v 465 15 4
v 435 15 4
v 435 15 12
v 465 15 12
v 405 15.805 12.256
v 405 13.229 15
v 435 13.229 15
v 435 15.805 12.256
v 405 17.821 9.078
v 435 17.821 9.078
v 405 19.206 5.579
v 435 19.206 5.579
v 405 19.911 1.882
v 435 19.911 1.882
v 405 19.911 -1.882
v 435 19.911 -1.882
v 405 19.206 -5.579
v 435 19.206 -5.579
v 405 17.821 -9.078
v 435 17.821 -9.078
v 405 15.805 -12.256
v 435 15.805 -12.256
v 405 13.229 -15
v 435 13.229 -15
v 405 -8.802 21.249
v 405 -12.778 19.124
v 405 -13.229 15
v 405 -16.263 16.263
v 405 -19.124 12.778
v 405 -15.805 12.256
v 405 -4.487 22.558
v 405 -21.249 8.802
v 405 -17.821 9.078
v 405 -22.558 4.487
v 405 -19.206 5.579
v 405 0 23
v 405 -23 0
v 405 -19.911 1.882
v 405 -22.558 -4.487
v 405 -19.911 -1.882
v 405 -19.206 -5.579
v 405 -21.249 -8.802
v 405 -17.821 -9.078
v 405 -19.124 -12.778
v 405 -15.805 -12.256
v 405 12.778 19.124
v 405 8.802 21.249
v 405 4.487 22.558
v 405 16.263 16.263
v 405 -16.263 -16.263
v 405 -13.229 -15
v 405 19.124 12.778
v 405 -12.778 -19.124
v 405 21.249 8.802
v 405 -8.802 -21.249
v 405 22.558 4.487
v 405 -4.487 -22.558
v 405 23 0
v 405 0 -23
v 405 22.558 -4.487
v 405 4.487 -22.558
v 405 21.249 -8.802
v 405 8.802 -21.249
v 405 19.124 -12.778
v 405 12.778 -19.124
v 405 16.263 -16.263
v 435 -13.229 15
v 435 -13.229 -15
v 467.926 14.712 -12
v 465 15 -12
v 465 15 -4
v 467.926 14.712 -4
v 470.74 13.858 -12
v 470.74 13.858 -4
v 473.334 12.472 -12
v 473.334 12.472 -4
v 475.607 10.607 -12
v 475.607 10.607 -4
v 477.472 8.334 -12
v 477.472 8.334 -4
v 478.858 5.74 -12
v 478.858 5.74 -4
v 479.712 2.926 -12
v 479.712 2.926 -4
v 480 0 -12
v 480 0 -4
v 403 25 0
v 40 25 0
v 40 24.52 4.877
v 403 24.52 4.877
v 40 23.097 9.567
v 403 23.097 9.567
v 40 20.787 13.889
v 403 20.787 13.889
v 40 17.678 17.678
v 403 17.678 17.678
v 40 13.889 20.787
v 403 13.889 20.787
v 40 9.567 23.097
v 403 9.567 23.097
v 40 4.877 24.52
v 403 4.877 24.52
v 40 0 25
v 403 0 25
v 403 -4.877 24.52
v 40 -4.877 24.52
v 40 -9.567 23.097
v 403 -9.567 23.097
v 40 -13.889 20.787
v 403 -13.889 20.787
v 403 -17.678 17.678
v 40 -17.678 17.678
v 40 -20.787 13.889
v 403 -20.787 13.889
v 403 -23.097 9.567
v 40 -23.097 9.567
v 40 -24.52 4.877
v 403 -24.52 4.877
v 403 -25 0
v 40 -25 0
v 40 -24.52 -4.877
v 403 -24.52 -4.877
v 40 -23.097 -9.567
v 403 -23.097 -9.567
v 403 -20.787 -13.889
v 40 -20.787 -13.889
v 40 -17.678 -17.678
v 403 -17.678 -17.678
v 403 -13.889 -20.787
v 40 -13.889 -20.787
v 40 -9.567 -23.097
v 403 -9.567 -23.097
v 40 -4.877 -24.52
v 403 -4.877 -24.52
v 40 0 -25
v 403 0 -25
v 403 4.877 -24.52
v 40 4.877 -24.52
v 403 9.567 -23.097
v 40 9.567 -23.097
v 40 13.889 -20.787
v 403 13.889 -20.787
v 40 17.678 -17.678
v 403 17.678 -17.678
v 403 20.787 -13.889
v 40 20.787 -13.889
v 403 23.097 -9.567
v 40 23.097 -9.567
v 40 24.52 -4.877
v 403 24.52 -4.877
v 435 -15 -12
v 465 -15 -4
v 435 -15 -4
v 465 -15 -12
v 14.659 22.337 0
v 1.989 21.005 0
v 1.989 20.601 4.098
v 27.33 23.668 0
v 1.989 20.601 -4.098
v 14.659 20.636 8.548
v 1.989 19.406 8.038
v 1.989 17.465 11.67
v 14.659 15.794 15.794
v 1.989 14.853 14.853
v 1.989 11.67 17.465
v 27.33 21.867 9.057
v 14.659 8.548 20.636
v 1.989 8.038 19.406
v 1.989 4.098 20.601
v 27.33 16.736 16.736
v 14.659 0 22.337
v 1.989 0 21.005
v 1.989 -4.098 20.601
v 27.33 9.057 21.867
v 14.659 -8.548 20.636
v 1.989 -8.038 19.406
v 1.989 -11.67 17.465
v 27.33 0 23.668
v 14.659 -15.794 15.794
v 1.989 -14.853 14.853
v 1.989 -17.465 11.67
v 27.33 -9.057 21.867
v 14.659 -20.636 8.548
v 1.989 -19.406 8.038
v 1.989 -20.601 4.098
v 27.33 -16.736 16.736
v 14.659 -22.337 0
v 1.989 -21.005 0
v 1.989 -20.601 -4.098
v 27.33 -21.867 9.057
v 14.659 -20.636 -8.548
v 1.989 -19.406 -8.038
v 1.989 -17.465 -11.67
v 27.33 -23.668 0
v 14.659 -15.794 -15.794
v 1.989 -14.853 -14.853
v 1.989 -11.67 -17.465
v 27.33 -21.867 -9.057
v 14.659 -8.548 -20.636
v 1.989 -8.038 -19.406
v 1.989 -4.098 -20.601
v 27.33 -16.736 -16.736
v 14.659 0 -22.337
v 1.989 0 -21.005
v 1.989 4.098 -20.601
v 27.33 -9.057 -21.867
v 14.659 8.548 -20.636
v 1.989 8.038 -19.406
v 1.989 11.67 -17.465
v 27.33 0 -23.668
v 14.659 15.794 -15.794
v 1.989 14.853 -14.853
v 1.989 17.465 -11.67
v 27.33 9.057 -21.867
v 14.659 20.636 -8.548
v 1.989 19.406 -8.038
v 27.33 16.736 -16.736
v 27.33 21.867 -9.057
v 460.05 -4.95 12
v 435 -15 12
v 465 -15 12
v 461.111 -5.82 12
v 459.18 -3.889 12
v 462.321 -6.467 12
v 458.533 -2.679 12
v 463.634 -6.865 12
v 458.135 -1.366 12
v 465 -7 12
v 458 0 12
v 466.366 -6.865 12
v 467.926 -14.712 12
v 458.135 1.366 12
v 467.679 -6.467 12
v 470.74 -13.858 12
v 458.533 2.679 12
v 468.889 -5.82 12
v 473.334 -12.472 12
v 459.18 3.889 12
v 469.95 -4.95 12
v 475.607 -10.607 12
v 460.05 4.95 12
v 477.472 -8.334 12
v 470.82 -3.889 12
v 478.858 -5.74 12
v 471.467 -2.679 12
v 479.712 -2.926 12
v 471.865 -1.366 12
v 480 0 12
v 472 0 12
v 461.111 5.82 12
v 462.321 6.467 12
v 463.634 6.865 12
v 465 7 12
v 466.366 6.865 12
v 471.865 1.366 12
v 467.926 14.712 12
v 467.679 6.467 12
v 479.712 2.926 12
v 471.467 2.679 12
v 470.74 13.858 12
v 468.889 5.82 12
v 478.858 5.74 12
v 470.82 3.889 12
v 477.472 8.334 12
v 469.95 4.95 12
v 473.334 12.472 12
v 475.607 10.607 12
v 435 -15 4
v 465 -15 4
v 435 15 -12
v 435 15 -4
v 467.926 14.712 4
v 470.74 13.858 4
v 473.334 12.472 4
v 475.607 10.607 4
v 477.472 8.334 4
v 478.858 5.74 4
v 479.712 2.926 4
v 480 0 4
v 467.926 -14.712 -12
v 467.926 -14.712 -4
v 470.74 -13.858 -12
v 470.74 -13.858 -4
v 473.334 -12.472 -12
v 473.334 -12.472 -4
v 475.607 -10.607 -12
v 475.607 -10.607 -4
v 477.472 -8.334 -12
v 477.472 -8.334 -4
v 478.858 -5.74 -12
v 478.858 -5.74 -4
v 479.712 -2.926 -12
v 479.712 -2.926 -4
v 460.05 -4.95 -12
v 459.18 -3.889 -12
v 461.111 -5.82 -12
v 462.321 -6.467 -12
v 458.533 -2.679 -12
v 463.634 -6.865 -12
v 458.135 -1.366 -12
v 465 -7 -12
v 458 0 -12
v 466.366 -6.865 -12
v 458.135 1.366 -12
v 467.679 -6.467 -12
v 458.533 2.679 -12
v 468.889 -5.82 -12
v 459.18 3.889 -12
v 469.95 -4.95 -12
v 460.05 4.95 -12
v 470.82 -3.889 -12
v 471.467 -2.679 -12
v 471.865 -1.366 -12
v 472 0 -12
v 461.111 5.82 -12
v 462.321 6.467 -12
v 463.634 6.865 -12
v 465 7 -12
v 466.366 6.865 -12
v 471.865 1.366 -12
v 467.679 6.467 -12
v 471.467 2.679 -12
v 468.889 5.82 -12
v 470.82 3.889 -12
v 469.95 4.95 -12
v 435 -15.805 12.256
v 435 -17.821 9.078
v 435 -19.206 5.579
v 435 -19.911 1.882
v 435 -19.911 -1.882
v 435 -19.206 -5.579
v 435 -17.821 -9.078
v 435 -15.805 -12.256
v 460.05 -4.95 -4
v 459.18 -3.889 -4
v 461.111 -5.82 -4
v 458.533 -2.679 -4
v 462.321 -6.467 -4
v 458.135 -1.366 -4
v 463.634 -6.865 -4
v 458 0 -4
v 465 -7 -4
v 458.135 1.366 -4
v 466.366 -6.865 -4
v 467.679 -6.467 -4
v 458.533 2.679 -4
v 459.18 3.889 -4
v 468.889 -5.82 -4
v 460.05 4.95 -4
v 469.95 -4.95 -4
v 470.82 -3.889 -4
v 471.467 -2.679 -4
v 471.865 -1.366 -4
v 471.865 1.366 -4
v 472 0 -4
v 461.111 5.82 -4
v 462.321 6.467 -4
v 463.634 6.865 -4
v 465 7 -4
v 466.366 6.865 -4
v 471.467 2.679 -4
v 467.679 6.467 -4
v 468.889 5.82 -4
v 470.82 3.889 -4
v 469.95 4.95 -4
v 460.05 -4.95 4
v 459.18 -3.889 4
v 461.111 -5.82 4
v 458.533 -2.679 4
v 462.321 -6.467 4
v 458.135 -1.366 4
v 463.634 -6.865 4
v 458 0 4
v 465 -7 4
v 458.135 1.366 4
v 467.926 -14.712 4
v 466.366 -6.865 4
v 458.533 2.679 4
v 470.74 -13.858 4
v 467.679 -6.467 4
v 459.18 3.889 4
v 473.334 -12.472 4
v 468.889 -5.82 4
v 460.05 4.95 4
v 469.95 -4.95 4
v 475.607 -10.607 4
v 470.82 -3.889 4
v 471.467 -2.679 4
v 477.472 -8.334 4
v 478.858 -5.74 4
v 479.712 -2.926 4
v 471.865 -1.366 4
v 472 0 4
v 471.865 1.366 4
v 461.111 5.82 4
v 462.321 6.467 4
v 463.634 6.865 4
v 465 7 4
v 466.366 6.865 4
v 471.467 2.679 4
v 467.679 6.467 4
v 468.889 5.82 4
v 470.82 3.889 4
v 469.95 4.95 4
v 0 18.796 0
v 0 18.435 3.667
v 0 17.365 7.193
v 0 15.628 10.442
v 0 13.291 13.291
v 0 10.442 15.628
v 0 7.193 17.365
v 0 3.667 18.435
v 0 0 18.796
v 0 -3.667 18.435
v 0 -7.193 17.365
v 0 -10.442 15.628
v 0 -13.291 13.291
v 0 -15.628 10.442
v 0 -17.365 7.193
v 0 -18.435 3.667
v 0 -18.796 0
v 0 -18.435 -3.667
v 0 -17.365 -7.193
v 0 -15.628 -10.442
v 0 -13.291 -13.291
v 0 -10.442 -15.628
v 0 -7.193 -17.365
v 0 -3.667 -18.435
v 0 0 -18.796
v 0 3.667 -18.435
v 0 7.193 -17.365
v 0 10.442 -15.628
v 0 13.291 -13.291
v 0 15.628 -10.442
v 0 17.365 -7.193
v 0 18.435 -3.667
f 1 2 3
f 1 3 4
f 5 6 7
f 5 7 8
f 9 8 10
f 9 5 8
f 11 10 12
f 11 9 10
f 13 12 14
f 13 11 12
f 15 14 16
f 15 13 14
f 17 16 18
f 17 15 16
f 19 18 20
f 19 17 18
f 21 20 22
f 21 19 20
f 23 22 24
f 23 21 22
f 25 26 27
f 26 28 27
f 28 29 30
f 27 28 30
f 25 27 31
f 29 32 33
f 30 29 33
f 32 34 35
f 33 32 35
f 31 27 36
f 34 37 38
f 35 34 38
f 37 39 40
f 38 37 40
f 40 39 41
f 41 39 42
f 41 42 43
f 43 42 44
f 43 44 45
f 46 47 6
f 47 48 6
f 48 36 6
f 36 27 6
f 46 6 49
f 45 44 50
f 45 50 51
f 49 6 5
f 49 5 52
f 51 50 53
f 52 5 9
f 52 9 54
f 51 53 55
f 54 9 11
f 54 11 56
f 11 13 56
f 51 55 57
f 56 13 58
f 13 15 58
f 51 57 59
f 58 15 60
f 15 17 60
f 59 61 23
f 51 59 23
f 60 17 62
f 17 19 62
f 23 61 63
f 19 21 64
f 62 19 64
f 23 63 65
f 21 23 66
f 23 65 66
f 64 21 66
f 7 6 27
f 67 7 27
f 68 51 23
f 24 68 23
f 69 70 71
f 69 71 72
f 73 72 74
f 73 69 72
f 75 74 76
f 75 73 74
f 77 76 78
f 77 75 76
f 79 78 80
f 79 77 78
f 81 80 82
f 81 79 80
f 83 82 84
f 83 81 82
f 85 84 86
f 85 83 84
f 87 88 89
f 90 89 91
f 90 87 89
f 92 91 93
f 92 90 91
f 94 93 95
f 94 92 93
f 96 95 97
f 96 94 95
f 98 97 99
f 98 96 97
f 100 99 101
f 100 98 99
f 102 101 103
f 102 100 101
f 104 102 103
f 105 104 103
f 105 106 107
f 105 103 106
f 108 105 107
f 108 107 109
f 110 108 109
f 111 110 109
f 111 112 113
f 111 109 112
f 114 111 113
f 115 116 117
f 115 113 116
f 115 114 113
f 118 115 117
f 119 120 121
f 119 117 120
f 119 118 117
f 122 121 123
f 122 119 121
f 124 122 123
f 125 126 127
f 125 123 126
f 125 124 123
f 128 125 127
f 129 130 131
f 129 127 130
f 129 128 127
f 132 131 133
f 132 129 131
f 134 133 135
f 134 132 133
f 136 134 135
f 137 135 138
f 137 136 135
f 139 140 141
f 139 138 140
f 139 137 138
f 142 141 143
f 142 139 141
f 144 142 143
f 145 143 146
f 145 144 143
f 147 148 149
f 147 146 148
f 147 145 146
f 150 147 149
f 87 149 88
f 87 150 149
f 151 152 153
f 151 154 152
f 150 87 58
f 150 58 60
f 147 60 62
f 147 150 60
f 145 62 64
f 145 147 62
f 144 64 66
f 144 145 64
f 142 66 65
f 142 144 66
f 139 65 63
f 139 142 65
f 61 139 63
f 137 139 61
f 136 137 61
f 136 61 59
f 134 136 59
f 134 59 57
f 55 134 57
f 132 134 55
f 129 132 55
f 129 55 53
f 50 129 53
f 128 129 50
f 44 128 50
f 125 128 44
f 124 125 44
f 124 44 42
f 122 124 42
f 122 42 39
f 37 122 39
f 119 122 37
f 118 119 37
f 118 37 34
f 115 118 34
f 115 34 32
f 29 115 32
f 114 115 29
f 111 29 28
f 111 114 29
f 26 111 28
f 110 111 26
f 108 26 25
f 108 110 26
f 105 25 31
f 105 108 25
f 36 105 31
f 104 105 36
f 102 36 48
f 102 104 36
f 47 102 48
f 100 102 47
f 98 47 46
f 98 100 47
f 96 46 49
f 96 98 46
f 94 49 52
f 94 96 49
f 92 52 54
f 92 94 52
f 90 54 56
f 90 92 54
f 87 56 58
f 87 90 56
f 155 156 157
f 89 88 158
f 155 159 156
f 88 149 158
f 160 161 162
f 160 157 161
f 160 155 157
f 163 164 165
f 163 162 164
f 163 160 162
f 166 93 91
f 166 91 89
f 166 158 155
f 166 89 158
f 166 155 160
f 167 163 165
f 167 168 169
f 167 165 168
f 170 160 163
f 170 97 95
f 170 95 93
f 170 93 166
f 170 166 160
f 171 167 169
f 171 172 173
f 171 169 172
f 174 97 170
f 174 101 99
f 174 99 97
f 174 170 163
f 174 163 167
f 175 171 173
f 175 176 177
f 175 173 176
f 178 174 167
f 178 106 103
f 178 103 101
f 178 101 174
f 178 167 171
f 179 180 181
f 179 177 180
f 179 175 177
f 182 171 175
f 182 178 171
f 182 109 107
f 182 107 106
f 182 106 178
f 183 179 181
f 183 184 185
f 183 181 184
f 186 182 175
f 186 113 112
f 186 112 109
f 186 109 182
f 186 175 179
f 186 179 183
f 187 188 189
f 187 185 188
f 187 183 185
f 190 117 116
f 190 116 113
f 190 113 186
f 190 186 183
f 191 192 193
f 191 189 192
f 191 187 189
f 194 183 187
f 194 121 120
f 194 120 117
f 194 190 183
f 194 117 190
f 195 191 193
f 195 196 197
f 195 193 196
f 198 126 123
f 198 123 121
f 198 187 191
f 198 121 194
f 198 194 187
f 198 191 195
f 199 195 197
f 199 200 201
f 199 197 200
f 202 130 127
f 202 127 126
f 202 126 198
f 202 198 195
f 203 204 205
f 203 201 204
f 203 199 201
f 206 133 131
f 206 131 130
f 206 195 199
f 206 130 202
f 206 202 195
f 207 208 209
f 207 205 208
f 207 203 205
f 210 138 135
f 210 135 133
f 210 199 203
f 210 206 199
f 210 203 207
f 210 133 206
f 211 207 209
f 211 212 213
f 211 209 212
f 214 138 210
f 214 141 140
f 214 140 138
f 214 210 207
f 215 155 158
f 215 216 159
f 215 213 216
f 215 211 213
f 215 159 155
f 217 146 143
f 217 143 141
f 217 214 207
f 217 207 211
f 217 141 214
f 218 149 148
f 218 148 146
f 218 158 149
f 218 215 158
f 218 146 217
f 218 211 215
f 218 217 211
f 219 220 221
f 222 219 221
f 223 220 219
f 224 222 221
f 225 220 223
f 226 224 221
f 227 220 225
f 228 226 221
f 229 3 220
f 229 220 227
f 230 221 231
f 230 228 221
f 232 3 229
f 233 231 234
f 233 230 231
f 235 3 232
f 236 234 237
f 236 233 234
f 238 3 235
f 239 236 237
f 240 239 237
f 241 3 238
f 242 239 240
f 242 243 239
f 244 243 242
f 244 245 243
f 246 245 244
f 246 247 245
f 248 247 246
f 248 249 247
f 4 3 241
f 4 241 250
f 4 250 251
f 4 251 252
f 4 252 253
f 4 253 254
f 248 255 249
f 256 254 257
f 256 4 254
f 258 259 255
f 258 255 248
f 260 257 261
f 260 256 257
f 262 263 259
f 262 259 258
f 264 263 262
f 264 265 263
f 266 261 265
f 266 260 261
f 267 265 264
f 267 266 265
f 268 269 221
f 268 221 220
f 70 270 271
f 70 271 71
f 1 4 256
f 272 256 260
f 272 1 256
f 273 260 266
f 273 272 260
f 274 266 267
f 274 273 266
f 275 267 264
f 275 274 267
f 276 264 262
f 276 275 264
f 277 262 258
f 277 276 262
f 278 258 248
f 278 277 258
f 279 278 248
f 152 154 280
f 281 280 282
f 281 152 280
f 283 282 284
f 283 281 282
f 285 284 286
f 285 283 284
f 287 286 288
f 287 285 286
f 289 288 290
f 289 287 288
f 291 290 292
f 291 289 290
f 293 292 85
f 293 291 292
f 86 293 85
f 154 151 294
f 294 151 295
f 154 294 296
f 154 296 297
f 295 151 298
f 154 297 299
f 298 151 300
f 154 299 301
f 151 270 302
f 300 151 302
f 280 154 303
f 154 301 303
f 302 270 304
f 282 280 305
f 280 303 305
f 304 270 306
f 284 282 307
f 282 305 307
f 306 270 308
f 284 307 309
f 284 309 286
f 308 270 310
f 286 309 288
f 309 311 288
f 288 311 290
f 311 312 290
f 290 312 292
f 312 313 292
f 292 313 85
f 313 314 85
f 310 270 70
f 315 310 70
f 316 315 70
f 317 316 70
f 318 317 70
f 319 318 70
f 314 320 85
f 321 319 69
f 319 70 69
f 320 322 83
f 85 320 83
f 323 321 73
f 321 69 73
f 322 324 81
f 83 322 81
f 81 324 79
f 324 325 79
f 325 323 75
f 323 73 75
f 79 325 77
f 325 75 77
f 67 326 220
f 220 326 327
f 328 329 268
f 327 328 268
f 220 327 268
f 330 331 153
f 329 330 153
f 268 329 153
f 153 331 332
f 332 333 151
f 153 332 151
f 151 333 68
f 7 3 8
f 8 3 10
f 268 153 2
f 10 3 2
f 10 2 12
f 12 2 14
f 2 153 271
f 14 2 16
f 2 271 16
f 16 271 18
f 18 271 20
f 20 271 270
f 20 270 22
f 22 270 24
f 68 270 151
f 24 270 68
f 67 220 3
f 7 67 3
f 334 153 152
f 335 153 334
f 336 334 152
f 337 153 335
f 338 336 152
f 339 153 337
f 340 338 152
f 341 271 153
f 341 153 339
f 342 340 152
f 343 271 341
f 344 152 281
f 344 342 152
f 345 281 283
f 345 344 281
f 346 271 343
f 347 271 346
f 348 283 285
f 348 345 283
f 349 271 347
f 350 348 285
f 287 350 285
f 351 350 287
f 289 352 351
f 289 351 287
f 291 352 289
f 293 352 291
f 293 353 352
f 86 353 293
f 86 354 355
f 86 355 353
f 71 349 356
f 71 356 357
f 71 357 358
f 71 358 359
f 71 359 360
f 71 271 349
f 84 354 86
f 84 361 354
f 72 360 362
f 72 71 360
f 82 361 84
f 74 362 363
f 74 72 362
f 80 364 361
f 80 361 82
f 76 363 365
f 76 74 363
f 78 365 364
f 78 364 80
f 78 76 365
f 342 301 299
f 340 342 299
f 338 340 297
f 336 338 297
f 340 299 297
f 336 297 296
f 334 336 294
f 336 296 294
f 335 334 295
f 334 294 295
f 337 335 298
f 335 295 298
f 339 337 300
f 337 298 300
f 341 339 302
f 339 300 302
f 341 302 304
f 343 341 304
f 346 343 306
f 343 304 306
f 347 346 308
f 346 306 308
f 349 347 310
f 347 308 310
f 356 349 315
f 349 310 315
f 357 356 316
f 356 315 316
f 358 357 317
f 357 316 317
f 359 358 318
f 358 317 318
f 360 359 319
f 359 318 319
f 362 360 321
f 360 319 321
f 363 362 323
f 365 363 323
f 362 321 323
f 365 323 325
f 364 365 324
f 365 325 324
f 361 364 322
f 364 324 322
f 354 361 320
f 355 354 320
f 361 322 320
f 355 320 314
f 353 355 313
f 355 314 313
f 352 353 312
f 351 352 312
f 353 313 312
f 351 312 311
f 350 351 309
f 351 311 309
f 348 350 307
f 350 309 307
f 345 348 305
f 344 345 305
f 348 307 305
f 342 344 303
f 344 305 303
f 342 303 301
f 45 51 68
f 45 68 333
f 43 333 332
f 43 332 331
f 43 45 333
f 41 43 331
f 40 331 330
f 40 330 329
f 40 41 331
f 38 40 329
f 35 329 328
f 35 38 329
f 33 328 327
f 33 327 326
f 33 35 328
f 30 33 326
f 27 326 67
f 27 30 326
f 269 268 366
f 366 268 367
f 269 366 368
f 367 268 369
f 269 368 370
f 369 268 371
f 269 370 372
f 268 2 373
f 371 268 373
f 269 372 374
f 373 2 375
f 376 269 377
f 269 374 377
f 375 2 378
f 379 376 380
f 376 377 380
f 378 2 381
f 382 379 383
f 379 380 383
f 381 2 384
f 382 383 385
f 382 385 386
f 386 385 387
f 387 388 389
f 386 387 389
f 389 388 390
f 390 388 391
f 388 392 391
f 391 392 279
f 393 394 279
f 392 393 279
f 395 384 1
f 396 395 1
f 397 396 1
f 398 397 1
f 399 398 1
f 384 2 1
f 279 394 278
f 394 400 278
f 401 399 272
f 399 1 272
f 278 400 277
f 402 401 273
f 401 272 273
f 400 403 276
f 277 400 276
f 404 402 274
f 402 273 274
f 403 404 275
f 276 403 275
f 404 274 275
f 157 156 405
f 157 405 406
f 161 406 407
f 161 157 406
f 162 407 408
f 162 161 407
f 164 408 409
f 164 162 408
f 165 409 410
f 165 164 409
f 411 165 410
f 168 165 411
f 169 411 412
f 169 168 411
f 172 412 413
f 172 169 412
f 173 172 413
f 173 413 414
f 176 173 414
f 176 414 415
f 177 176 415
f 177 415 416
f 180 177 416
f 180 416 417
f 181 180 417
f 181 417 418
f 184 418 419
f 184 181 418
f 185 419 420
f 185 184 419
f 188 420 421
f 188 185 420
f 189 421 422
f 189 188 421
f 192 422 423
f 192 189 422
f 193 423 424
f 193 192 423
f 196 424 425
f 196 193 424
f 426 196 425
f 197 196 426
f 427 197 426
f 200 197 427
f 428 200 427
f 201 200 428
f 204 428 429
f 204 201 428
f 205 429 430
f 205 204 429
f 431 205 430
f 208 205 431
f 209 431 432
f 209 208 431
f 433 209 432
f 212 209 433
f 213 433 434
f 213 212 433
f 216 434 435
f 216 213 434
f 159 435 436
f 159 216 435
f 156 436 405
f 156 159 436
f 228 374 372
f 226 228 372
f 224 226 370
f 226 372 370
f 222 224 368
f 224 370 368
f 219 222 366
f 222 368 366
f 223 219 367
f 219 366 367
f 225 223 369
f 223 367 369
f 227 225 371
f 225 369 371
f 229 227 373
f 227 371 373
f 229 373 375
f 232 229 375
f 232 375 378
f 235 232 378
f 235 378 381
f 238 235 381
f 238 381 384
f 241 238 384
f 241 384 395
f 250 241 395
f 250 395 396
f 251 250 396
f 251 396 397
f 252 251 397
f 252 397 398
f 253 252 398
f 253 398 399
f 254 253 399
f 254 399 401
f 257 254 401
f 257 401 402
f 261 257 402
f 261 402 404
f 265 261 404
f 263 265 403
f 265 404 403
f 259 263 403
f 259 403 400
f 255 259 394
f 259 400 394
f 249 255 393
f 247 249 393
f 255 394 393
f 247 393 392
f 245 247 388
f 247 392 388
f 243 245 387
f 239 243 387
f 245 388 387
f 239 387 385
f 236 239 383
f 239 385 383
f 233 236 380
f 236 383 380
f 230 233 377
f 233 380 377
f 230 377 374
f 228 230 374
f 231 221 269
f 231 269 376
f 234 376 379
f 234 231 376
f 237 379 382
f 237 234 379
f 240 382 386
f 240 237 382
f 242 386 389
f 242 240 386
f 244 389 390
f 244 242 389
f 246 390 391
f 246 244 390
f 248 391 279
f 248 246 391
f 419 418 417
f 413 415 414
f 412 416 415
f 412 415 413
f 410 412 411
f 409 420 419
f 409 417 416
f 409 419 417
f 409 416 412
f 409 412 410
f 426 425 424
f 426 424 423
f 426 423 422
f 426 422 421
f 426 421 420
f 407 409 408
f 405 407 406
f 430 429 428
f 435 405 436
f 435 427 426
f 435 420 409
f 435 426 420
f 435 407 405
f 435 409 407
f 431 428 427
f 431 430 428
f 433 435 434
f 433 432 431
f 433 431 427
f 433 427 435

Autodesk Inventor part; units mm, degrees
ref_plane "YZ Plane" through (0, 0, 0) normal (1, 0, 0) x (0, 1, 0)
ref_plane "XZ Plane" through (0, 0, 0) normal (0, 1, 0) x (-1, 0, 0)
ref_plane "XY Plane" through (0, 0, 0) normal (0, 0, 1) x (1, 0, 0)
sketch "Skizze1" plane through (0, 0, 0) normal (0, 0, 1) x (1, 0, 0)
  line L0 (0, 0) -> (0, 20.7958)
  line L1 (0, 20.7958) -> (40, 25)
  line L2 (40, 25) -> (405, 25)
  line L3 (405, 25) -> (405, 0)
  line L4 (405, 0) -> (0, 0)
  line L5 (405, 0) -> (435, 0)
  line L6 (435, 0) -> (435, 20)
  line L7 (435, 20) -> (405, 20)
  line L8 (405, 20) -> (405, 0)
  line L9 (435, 15) -> (480, 15)
  line L10 (480, 15) -> (480, -15)
  line L11 (480, -15) -> (435, -15)
  line L12 (435, -15) -> (435, 15)
  dimension "d0" = 480
  dimension "d1" = 30
  dimension "d2" = 40
  dimension "d3" = 50
  dimension "d4" = 6
  dimension "d5" = 40
  dimension "d6" = 30
  dimension "d7" = 75
revolve "Umdrehung1" add sketch "Skizze1" angle 360 about axis through (405, 0, 0) along (-1, 0, 0) contours L0 L1 L2 L3 L4 | L3 L7 L6 L5
extrude "Extrusion1" add sketch "Skizze1" along normal mid plane 24 contours L6 L9 L10 L11 L12
full round fillet "Rundung1" first side at (450, 15, 4) centre faces at (480, 5, 4) second side at (450, -15, -4)
extrude "Extrusion2" cut sketch "Skizze1" along normal mid plane 8 contours L6 L9 L10 L11 L12
sketch "Skizze2" plane through (0, 0, 12) normal (0, 0, 1) x (1, 0, 0)
  arc A0 (465, -15) -> (465, 15) centre (465, 0) ccw projected
  point P0 (0, 0)
hole "Bohrung1" at (465, 0, 12) direction (0, 0, -1) diameter 14 end through all
sketch "Skizze3" plane through (435, 0, 0) normal (1, 0, 0) x (0, 0, -1)
  line L0 (-15, -20) -> (-20, -20)
  line L1 (-20, -20) -> (-20, 20)
  line L2 (-20, 20) -> (-15, 20)
  line L3 (-15, 20) -> (-15, -20)
  line L4 (20, -20) -> (15, -20)
  line L5 (15, -20) -> (15, 20)
  line L6 (15, 20) -> (20, 20)
  line L7 (20, 20) -> (20, -20)
  circle A0 centre (0, 0) radius 20 projected
  point P0 (-15, -13.2288)
  point P1 (-20, 0)
  point P2 (-15, 13.2288)
  dimension "d20" = 30
extrude "Extrusion3" cut sketch "Skizze3" against normal up to surface (30 mm away) contours L0 L1 A0 L3 | A0 L3 | L1 L2 L3 A0 | A0 L7 L4 L5 | L5 A0 | L5 L6 L7 A0
chamfer "Fase1" distance 2 angle 45 2 edges at (405, -25, 0) (0, -20.7958, 0)
properties part number "Kolbenstange" material "Stahl AISI 4130"
